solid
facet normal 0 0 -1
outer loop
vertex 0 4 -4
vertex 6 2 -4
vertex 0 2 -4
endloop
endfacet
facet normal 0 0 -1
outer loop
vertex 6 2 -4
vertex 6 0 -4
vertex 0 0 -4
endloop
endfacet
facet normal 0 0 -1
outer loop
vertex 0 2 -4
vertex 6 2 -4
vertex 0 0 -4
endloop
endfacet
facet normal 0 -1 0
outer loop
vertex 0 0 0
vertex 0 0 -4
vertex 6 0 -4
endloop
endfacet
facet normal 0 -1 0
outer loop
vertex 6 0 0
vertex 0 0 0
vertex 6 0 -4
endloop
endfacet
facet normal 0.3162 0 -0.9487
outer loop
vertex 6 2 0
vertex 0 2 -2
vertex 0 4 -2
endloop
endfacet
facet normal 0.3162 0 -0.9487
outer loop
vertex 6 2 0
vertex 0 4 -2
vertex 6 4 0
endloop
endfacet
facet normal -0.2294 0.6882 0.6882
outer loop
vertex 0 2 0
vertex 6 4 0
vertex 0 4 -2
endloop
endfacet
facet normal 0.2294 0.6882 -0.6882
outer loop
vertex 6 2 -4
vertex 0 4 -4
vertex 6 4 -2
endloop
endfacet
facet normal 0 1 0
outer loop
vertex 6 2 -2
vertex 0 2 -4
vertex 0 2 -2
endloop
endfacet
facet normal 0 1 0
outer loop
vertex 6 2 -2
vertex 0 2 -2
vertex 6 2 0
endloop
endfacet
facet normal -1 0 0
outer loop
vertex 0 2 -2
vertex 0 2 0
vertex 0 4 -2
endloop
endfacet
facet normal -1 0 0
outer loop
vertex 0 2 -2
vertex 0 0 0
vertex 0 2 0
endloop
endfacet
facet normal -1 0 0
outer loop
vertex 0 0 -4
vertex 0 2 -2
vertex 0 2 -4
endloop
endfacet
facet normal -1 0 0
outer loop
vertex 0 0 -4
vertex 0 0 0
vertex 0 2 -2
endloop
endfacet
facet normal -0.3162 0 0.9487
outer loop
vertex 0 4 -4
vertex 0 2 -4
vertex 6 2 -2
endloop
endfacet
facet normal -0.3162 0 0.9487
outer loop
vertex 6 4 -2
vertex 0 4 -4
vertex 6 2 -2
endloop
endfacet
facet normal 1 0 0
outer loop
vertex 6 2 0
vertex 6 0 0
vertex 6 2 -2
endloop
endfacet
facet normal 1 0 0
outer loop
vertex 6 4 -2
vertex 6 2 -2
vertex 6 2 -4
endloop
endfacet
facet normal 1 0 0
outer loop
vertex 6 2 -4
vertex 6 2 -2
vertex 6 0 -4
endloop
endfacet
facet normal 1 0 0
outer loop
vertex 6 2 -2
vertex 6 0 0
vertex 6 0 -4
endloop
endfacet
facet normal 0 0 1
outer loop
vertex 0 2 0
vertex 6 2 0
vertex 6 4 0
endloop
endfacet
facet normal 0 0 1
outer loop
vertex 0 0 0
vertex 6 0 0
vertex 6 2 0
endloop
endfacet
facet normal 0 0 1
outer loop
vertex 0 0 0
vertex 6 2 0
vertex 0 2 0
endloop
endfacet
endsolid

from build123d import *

# Parameters (mm, degrees)
SKETCH_1_W          = 6
SKETCH_1_H          = 4
EXTRUDE_1_DEPTH     = 2
EXTRUDE_2_DEPTH     = 2
EXTRUDE_3_DEPTH     = 2
CUT_EXTRUDE_1_DEPTH = 2
CUT_EXTRUDE_2_DEPTH = 2


with BuildPart() as part:
    # 草圖1 → 填料-伸長1 (new body)
    with BuildSketch(Plane(origin=(0, 0, 0), x_dir=(1, 0, 0), z_dir=(0, 1, 0))):
        with Locations((3, 2)):
            Rectangle(SKETCH_1_W, SKETCH_1_H)
    extrude(amount=EXTRUDE_1_DEPTH)

    # 草圖2 → 填料-伸長2 (add)
    with BuildSketch(Plane(origin=(0, 2, 0), x_dir=(1, 0, 0), z_dir=(0, 1, 0))):
        Polygon((0, 4), (6, 2), (6, 4), align=None)
    extrude(amount=EXTRUDE_2_DEPTH)

    # 草圖4 → 填料-伸長3 (add)
    with BuildSketch(Plane(origin=(0, 2, 0), x_dir=(1, 0, 0), z_dir=(0, 1, 0))):
        Polygon((0, 0), (0, 2), (6, 0), align=None)
    extrude(amount=EXTRUDE_3_DEPTH)

    # Sketch 3D_1 → 除料-伸長1 (cut, along a direction that is not the sketch's normal)
    with BuildSketch(Plane(origin=(6, 2, -4), x_dir=(-0.9486832980505139, 0.316227766016838, 0), z_dir=(0.2294157338705617, 0.6882472016116854, -0.6882472016116854))):
        Polygon((0, 0), (0.632455532, 2.75680975), (6.32455532, 0), align=None)
    extrude(amount=CUT_EXTRUDE_1_DEPTH, dir=(0, 1, 0), mode=Mode.SUBTRACT)

    # Sketch 3D_2 → 除料-伸長2 (cut, along a direction that is not the sketch's normal)
    with BuildSketch(Plane(origin=(0, 2, 0), x_dir=(0.9486832980505139, 0.316227766016838, 0), z_dir=(-0.22941573387056177, 0.6882472016116853, 0.6882472016116854))):
        Polygon((0, 0), (0.632455532, 2.75680975), (6.32455532, 0), align=None)
    extrude(amount=CUT_EXTRUDE_2_DEPTH, dir=(0, 0, 1), mode=Mode.SUBTRACT)


solid = part.part
